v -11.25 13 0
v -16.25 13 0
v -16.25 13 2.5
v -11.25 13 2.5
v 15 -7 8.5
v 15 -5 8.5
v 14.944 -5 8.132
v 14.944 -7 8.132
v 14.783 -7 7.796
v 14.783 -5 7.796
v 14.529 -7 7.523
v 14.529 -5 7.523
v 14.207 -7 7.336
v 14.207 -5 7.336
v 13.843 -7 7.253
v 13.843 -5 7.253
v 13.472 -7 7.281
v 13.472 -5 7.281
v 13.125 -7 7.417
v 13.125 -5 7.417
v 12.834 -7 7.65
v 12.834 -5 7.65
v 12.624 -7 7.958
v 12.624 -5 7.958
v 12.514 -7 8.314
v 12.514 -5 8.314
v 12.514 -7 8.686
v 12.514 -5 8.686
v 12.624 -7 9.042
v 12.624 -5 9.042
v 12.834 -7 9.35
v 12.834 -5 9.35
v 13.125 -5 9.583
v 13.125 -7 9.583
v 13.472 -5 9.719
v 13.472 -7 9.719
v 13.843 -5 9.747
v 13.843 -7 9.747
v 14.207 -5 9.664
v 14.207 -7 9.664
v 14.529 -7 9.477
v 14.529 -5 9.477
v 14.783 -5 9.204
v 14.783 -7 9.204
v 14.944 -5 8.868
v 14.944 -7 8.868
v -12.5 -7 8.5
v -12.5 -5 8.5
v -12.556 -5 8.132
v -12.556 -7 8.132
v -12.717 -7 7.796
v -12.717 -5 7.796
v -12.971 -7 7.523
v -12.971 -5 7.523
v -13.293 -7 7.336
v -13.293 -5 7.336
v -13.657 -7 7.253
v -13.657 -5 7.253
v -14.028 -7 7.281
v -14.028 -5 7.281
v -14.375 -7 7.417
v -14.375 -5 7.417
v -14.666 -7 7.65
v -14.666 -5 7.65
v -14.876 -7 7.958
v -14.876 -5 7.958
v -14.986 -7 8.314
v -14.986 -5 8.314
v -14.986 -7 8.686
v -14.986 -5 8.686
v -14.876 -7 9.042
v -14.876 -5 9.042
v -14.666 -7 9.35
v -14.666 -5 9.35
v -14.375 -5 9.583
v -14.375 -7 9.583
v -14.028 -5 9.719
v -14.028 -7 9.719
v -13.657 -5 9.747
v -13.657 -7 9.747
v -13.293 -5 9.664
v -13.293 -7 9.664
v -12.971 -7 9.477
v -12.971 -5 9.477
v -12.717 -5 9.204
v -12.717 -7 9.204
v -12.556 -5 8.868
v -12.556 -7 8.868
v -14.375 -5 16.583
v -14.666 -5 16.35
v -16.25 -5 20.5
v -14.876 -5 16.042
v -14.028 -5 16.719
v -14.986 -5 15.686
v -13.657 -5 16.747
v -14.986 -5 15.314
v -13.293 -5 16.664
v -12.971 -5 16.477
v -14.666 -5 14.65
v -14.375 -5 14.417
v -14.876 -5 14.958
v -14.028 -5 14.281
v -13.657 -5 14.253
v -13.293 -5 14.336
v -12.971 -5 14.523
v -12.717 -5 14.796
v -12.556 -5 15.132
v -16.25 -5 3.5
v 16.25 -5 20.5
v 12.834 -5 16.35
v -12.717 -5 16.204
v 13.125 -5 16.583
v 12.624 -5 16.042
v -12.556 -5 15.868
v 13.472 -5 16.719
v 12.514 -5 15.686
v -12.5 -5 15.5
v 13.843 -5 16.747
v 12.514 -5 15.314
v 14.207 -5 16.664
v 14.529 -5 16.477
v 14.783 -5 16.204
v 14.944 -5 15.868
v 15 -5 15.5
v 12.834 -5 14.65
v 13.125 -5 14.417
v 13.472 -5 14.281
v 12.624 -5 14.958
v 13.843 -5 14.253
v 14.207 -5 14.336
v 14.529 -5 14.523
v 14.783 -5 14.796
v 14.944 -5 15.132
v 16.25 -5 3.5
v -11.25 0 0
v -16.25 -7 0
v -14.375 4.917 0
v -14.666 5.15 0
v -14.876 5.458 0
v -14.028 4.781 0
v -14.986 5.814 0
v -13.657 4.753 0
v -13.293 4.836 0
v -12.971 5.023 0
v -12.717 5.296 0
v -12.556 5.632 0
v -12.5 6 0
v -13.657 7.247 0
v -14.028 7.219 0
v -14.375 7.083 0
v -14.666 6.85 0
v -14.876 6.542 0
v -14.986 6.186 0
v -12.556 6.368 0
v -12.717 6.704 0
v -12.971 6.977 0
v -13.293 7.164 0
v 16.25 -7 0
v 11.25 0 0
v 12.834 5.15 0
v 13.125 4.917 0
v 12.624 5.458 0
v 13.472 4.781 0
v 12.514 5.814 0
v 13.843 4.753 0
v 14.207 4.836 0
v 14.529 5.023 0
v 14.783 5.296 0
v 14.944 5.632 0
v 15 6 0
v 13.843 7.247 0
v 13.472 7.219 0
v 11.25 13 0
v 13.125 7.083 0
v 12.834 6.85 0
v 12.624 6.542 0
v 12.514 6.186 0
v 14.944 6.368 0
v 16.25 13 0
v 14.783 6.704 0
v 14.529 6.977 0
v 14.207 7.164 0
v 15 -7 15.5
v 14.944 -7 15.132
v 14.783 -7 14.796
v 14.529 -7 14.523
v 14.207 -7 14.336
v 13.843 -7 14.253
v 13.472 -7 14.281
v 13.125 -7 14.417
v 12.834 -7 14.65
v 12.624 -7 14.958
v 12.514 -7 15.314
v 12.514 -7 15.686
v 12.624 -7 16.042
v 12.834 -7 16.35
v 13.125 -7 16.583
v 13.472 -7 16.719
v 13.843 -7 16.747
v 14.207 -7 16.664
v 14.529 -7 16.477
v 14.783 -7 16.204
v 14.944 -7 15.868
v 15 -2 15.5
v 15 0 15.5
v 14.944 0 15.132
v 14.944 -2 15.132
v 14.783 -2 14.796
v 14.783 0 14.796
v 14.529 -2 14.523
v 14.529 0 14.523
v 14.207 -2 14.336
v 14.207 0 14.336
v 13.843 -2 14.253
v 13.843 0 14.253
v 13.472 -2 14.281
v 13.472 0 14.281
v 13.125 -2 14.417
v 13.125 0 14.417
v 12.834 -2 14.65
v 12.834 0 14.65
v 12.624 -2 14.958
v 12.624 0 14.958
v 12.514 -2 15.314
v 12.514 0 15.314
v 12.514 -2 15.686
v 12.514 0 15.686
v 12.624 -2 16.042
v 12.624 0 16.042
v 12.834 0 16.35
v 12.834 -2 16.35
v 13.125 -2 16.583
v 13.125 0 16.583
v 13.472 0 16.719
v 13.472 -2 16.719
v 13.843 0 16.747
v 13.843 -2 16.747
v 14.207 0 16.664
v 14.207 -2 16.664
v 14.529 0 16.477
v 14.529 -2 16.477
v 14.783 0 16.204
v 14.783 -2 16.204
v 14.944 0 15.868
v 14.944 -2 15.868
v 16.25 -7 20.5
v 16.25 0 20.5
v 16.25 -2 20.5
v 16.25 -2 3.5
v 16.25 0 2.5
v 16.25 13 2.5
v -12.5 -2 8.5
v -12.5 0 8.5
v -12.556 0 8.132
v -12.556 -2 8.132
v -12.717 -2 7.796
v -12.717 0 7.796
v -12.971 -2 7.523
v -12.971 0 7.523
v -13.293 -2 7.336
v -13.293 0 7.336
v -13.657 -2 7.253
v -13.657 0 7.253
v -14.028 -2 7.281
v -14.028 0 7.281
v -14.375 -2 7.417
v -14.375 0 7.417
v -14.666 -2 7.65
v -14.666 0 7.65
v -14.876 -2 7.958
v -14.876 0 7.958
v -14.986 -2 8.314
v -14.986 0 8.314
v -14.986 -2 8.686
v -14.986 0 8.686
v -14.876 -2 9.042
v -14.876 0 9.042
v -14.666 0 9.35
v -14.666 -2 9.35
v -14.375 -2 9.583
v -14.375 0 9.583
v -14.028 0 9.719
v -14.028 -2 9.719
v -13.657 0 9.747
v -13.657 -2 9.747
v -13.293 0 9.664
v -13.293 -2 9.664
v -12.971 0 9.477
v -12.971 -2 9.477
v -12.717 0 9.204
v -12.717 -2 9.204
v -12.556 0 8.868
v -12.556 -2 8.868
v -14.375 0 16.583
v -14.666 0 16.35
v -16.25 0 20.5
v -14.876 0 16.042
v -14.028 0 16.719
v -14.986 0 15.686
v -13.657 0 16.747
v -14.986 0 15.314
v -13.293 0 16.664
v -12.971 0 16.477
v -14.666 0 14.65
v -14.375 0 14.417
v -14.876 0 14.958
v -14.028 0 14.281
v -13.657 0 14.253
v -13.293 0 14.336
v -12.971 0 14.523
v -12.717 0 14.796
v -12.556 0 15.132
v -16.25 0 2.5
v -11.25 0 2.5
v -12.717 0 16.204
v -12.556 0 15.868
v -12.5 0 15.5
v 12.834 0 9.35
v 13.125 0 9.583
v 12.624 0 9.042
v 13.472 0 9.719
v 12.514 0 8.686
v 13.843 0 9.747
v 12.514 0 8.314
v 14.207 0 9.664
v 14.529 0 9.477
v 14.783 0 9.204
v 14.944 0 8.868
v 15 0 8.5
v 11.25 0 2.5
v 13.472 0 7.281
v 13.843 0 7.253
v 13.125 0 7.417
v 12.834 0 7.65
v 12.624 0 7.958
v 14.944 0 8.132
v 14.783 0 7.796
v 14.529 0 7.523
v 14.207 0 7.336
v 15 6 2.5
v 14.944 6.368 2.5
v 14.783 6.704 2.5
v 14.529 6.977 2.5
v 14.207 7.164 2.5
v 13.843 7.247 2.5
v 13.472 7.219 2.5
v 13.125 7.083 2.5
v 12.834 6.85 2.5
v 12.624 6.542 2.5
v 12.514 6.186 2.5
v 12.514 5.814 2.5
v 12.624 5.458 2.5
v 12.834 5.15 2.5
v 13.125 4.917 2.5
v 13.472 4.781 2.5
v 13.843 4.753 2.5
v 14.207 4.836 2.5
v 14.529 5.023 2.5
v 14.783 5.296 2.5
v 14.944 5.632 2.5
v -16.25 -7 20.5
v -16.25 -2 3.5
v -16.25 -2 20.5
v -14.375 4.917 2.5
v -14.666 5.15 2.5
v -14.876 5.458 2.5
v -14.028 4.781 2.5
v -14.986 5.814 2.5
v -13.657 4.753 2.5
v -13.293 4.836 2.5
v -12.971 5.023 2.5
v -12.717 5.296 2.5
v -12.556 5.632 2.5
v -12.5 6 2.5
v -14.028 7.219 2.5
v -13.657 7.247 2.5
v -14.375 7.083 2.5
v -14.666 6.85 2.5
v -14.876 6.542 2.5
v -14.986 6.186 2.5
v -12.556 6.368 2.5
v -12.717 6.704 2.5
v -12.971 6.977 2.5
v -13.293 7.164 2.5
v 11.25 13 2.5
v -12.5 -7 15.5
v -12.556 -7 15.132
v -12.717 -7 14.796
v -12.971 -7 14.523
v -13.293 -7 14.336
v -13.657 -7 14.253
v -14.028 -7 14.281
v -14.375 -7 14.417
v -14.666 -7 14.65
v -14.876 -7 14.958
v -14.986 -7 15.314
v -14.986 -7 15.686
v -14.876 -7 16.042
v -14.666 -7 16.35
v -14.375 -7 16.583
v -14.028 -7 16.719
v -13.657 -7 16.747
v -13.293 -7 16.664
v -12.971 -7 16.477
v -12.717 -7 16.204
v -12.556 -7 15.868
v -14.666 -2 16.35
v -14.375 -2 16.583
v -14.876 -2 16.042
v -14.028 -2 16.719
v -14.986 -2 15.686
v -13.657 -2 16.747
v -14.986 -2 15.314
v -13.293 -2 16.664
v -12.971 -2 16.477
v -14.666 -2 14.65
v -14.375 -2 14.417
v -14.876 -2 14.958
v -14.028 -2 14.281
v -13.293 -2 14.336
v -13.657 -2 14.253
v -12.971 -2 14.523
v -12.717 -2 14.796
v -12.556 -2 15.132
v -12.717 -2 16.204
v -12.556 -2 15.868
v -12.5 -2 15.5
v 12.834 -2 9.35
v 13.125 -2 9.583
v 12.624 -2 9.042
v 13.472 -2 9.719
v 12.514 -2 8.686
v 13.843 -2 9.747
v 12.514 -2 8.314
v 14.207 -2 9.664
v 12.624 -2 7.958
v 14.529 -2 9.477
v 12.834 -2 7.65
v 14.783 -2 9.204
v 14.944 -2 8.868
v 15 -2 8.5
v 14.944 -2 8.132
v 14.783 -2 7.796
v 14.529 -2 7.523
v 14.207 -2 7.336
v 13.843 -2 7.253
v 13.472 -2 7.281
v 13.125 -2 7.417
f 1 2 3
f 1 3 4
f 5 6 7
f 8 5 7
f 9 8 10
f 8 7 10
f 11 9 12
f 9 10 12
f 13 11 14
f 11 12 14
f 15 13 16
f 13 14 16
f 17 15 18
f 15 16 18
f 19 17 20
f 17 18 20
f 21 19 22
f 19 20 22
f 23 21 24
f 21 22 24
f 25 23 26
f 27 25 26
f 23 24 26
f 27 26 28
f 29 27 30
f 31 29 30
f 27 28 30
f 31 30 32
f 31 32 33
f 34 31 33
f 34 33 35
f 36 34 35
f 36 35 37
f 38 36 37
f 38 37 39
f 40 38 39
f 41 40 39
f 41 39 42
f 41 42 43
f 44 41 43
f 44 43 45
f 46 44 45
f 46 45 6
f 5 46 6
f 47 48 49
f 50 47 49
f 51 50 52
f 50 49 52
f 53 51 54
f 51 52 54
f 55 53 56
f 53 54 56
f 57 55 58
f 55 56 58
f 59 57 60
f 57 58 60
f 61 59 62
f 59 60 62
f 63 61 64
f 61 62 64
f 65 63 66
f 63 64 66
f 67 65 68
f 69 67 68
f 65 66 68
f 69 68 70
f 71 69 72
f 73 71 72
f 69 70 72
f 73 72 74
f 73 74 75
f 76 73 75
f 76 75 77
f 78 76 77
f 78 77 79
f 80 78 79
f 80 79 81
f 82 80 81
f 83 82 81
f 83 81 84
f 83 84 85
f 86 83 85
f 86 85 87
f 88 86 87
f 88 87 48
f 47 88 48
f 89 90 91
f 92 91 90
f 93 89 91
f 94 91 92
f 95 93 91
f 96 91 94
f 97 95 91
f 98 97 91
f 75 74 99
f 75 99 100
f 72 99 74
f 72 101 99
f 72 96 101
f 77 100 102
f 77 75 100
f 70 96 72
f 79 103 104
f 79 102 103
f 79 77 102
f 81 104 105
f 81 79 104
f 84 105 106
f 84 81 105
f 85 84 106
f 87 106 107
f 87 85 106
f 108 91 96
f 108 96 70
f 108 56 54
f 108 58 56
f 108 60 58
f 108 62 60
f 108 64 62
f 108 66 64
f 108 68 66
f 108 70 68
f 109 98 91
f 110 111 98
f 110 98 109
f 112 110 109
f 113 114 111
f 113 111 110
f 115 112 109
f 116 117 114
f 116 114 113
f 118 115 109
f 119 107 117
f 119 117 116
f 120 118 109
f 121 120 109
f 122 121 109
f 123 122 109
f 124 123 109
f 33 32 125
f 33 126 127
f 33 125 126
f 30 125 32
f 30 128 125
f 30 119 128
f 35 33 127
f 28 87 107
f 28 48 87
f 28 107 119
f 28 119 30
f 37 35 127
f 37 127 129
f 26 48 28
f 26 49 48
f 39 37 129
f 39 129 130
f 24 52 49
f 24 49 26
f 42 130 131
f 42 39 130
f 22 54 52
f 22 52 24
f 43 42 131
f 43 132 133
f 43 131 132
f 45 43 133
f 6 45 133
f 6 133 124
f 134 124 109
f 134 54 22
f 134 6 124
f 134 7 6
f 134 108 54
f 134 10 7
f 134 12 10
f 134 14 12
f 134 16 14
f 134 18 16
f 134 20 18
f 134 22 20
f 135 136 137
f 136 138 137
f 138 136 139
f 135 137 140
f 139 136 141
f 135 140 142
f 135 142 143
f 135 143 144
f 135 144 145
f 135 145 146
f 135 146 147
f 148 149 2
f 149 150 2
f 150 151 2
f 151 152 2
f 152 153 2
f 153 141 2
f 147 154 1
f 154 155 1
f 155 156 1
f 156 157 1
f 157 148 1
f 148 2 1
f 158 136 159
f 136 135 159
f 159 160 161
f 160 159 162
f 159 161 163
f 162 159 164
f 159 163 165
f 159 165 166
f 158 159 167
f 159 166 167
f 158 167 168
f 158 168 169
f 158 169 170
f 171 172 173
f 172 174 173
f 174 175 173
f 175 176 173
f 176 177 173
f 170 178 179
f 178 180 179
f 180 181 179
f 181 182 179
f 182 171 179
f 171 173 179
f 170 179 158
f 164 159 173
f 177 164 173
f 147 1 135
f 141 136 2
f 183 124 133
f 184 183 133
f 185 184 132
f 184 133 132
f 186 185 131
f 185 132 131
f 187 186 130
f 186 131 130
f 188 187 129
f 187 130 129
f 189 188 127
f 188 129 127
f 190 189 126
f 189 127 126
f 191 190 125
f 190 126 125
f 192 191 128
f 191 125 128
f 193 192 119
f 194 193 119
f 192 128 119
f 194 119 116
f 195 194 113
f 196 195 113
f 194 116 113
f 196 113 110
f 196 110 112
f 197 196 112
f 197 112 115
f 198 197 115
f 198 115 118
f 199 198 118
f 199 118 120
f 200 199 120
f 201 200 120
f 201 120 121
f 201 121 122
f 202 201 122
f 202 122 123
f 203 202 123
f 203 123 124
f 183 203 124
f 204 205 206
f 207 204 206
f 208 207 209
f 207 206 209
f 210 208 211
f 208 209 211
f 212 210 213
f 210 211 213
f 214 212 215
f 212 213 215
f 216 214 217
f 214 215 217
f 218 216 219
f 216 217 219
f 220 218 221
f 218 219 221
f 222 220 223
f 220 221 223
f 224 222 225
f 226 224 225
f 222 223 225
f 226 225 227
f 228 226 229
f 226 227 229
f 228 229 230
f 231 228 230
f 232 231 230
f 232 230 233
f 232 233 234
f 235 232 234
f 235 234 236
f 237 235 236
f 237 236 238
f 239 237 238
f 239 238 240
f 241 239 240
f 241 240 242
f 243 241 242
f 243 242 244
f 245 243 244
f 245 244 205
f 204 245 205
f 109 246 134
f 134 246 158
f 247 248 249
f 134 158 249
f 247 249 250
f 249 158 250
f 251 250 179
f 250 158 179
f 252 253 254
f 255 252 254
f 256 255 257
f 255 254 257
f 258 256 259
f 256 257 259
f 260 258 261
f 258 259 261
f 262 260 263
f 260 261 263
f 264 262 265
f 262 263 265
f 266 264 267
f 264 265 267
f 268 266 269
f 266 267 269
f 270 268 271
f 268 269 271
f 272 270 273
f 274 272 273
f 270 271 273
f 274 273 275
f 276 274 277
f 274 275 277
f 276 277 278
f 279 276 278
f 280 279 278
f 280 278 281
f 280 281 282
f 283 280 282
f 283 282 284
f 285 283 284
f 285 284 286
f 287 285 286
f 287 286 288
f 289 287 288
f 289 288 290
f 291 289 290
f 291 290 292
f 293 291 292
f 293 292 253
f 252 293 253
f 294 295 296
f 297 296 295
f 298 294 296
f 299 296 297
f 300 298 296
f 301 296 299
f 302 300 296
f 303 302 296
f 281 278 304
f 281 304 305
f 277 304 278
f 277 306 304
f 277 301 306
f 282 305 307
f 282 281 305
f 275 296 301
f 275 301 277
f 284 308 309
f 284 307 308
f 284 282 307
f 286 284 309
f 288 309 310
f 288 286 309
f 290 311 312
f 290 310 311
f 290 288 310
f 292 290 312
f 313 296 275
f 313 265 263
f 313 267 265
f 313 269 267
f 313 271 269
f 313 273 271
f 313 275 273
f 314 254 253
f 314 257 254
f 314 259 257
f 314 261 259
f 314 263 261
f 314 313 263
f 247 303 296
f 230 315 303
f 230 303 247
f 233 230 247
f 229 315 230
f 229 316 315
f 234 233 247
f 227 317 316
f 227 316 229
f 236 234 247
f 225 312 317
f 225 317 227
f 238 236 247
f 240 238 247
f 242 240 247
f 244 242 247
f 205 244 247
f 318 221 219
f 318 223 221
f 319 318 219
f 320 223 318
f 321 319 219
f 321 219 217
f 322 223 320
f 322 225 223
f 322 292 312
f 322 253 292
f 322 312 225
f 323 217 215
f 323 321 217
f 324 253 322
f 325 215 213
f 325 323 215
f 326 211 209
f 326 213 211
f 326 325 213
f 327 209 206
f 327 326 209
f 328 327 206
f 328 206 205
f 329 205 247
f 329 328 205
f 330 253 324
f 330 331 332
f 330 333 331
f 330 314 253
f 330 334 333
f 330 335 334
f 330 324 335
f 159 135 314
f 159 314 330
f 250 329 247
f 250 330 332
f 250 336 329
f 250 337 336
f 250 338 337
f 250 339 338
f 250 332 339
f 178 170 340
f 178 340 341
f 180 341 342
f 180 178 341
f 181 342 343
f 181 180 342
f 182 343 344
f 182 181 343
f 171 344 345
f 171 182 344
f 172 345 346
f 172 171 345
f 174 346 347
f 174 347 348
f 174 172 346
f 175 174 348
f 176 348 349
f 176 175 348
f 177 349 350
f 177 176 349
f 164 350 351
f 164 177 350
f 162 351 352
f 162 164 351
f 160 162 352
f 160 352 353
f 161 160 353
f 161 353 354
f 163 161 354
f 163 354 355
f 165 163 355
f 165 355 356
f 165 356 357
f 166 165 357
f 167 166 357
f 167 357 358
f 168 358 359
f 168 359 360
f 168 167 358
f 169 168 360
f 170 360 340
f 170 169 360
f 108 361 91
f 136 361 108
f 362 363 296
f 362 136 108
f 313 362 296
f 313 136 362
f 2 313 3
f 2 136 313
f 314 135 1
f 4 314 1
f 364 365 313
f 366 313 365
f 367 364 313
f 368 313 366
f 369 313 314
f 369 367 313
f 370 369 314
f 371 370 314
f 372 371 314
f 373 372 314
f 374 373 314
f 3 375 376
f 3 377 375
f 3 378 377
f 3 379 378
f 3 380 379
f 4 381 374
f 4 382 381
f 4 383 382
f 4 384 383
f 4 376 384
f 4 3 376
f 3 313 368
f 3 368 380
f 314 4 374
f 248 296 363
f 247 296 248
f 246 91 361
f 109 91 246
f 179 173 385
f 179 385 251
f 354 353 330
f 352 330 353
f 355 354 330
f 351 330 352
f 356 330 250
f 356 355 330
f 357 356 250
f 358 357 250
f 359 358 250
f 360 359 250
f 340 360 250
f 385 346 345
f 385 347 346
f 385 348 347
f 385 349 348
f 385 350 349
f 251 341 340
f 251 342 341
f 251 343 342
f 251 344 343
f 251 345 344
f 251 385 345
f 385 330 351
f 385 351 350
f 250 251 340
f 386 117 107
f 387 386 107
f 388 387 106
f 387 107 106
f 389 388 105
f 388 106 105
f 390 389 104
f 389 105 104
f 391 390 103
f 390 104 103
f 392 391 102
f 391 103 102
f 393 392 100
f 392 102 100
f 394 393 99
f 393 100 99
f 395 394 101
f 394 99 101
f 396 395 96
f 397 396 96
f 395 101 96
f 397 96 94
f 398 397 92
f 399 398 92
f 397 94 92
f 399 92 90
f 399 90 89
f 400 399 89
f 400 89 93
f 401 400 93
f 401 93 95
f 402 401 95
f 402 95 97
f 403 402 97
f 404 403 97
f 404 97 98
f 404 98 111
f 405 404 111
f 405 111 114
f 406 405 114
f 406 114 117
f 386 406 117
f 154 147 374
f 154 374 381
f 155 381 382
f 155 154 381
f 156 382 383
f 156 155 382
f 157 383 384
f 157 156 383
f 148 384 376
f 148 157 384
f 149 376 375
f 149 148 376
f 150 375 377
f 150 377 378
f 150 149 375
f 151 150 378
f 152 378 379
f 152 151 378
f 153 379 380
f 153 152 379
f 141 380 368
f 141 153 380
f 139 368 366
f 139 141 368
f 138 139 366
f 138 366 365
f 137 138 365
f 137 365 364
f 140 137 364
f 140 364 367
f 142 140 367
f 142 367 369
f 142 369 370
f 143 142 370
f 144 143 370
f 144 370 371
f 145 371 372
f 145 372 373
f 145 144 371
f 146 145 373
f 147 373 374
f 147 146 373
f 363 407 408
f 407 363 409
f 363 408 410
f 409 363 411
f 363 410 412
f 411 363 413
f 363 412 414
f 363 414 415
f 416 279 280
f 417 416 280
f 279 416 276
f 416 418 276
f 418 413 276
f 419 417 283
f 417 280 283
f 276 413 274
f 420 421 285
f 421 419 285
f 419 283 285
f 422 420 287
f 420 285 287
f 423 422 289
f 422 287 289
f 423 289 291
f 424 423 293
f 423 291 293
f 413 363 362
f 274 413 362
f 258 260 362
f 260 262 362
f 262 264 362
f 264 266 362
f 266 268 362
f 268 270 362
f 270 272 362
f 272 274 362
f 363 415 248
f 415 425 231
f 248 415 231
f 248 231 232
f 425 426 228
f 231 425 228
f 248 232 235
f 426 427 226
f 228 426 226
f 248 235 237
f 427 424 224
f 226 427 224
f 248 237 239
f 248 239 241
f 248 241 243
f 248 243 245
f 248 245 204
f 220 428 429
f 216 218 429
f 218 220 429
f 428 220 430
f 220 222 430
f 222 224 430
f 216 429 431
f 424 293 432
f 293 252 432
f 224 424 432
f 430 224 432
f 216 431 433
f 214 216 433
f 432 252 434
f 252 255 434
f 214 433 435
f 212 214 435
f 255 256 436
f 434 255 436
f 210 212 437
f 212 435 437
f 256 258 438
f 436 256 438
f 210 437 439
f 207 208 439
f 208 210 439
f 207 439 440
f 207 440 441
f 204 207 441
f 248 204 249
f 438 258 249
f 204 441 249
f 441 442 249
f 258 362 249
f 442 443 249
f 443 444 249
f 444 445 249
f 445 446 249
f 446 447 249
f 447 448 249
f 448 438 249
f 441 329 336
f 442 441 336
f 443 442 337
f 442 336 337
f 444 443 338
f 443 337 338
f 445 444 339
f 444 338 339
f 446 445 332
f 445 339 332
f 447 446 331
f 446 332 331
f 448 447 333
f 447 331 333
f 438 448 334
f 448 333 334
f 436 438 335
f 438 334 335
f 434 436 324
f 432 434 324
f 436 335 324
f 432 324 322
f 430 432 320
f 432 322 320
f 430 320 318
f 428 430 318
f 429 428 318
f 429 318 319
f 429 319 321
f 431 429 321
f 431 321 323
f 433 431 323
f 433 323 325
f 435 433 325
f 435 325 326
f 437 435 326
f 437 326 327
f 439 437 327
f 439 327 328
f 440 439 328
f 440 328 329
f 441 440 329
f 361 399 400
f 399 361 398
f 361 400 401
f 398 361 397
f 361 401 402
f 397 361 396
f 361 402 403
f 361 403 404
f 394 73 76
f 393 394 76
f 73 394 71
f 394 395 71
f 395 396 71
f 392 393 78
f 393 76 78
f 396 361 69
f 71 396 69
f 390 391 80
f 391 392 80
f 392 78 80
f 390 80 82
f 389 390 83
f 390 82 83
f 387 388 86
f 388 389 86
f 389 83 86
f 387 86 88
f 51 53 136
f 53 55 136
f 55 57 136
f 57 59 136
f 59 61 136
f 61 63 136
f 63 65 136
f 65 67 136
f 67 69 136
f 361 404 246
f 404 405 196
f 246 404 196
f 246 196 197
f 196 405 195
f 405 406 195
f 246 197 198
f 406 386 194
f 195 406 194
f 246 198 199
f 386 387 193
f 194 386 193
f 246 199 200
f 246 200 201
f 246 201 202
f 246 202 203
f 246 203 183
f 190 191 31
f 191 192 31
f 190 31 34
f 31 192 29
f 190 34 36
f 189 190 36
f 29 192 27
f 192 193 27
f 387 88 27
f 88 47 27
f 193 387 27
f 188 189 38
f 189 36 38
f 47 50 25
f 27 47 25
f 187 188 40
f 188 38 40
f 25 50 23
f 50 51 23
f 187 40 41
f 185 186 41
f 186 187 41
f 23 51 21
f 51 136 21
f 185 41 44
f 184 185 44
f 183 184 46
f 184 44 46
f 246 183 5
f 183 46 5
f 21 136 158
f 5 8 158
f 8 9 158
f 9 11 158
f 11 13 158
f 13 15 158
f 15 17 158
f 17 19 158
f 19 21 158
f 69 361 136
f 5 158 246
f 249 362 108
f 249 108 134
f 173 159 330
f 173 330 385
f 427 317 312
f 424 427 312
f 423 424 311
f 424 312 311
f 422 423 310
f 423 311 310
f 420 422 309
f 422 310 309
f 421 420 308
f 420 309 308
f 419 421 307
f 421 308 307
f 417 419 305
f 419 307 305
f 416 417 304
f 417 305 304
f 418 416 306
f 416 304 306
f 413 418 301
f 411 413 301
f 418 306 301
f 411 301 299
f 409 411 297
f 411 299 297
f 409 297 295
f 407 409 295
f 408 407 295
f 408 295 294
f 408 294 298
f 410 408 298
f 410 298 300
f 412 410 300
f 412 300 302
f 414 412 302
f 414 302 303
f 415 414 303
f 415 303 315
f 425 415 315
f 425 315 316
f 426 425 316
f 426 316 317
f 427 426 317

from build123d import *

# Parameters (mm, degrees)
SKETCH1_W               = 5
SKETCH1_H               = 13
SKETCH1_R               = 1.25
BOSS_EXTRUDE1_DEPTH     = 2.5
BOSS_EXTRUDE1_2_DEPTH   = 2.5
SKETCH1_5_W             = 32.5
SKETCH1_5_H             = 2
BOSS_EXTRUDE2_DEPTH     = 20.5
SKETCH1_6_W             = 32.5
SKETCH1_6_H             = 3
BOSS_EXTRUDE3_DEPTH     = 3.5
SKETCH2_R               = 1.25
CUT_EXTRUDE2_DEPTH      = 14
CUT_EXTRUDE2_DEPTH_BACK = 8


with BuildPart() as part:
    # Sketch1 → Boss-Extrude1 (new body)
    with BuildSketch(Plane.XY):
        with Locations((-13.75, 6.5)):
            Rectangle(SKETCH1_W, SKETCH1_H)
        with Locations((-13.75, 6)):
            Circle(SKETCH1_R, mode=Mode.SUBTRACT)
    extrude(amount=BOSS_EXTRUDE1_DEPTH)



with BuildPart() as body_2:
    # Sketch1 → Boss-Extrude1 2 (new body)
    with BuildSketch(Plane.XY):
        with Locations((13.75, 6.5)):
            Rectangle(SKETCH1_W, SKETCH1_H)
        with Locations((13.75, 6)):
            Circle(SKETCH1_R, mode=Mode.SUBTRACT)
    extrude(amount=BOSS_EXTRUDE1_2_DEPTH)


with BuildPart() as part_1:
    add(part.part)

    add(body_2.part)  # Boss-Extrude2 merges body 2
    # Sketch1<5> → Boss-Extrude2 (add)
    with BuildSketch(Plane.XY):
        with Locations((0, -1)):
            Rectangle(SKETCH1_5_W, SKETCH1_5_H)
        with Locations((0, -6)):
            Rectangle(SKETCH1_5_W, SKETCH1_5_H)
    extrude(amount=BOSS_EXTRUDE2_DEPTH)

    # Sketch1<6> → Boss-Extrude3 (add)
    with BuildSketch(Plane.XY):
        with Locations((0, -3.5)):
            Rectangle(SKETCH1_6_W, SKETCH1_6_H)
    extrude(amount=BOSS_EXTRUDE3_DEPTH)

    # Sketch2 → Cut-Extrude2 (cut, two sides)
    with BuildSketch(Plane(origin=(0, 0, 0), x_dir=(1, 0, 0), z_dir=(0, 1, 0))) as cut_extrude2_sk:
        with Locations((13.75, -8.5)):
            Circle(SKETCH2_R)
        with Locations((13.75, -15.5)):
            Circle(SKETCH2_R)
        with Locations((-13.75, -15.5)):
            Circle(SKETCH2_R)
        with Locations((-13.75, -8.5)):
            Circle(SKETCH2_R)
    extrude(amount=CUT_EXTRUDE2_DEPTH, mode=Mode.SUBTRACT)
    extrude(cut_extrude2_sk.sketch, amount=-CUT_EXTRUDE2_DEPTH_BACK, mode=Mode.SUBTRACT)


solid = part_1.part
